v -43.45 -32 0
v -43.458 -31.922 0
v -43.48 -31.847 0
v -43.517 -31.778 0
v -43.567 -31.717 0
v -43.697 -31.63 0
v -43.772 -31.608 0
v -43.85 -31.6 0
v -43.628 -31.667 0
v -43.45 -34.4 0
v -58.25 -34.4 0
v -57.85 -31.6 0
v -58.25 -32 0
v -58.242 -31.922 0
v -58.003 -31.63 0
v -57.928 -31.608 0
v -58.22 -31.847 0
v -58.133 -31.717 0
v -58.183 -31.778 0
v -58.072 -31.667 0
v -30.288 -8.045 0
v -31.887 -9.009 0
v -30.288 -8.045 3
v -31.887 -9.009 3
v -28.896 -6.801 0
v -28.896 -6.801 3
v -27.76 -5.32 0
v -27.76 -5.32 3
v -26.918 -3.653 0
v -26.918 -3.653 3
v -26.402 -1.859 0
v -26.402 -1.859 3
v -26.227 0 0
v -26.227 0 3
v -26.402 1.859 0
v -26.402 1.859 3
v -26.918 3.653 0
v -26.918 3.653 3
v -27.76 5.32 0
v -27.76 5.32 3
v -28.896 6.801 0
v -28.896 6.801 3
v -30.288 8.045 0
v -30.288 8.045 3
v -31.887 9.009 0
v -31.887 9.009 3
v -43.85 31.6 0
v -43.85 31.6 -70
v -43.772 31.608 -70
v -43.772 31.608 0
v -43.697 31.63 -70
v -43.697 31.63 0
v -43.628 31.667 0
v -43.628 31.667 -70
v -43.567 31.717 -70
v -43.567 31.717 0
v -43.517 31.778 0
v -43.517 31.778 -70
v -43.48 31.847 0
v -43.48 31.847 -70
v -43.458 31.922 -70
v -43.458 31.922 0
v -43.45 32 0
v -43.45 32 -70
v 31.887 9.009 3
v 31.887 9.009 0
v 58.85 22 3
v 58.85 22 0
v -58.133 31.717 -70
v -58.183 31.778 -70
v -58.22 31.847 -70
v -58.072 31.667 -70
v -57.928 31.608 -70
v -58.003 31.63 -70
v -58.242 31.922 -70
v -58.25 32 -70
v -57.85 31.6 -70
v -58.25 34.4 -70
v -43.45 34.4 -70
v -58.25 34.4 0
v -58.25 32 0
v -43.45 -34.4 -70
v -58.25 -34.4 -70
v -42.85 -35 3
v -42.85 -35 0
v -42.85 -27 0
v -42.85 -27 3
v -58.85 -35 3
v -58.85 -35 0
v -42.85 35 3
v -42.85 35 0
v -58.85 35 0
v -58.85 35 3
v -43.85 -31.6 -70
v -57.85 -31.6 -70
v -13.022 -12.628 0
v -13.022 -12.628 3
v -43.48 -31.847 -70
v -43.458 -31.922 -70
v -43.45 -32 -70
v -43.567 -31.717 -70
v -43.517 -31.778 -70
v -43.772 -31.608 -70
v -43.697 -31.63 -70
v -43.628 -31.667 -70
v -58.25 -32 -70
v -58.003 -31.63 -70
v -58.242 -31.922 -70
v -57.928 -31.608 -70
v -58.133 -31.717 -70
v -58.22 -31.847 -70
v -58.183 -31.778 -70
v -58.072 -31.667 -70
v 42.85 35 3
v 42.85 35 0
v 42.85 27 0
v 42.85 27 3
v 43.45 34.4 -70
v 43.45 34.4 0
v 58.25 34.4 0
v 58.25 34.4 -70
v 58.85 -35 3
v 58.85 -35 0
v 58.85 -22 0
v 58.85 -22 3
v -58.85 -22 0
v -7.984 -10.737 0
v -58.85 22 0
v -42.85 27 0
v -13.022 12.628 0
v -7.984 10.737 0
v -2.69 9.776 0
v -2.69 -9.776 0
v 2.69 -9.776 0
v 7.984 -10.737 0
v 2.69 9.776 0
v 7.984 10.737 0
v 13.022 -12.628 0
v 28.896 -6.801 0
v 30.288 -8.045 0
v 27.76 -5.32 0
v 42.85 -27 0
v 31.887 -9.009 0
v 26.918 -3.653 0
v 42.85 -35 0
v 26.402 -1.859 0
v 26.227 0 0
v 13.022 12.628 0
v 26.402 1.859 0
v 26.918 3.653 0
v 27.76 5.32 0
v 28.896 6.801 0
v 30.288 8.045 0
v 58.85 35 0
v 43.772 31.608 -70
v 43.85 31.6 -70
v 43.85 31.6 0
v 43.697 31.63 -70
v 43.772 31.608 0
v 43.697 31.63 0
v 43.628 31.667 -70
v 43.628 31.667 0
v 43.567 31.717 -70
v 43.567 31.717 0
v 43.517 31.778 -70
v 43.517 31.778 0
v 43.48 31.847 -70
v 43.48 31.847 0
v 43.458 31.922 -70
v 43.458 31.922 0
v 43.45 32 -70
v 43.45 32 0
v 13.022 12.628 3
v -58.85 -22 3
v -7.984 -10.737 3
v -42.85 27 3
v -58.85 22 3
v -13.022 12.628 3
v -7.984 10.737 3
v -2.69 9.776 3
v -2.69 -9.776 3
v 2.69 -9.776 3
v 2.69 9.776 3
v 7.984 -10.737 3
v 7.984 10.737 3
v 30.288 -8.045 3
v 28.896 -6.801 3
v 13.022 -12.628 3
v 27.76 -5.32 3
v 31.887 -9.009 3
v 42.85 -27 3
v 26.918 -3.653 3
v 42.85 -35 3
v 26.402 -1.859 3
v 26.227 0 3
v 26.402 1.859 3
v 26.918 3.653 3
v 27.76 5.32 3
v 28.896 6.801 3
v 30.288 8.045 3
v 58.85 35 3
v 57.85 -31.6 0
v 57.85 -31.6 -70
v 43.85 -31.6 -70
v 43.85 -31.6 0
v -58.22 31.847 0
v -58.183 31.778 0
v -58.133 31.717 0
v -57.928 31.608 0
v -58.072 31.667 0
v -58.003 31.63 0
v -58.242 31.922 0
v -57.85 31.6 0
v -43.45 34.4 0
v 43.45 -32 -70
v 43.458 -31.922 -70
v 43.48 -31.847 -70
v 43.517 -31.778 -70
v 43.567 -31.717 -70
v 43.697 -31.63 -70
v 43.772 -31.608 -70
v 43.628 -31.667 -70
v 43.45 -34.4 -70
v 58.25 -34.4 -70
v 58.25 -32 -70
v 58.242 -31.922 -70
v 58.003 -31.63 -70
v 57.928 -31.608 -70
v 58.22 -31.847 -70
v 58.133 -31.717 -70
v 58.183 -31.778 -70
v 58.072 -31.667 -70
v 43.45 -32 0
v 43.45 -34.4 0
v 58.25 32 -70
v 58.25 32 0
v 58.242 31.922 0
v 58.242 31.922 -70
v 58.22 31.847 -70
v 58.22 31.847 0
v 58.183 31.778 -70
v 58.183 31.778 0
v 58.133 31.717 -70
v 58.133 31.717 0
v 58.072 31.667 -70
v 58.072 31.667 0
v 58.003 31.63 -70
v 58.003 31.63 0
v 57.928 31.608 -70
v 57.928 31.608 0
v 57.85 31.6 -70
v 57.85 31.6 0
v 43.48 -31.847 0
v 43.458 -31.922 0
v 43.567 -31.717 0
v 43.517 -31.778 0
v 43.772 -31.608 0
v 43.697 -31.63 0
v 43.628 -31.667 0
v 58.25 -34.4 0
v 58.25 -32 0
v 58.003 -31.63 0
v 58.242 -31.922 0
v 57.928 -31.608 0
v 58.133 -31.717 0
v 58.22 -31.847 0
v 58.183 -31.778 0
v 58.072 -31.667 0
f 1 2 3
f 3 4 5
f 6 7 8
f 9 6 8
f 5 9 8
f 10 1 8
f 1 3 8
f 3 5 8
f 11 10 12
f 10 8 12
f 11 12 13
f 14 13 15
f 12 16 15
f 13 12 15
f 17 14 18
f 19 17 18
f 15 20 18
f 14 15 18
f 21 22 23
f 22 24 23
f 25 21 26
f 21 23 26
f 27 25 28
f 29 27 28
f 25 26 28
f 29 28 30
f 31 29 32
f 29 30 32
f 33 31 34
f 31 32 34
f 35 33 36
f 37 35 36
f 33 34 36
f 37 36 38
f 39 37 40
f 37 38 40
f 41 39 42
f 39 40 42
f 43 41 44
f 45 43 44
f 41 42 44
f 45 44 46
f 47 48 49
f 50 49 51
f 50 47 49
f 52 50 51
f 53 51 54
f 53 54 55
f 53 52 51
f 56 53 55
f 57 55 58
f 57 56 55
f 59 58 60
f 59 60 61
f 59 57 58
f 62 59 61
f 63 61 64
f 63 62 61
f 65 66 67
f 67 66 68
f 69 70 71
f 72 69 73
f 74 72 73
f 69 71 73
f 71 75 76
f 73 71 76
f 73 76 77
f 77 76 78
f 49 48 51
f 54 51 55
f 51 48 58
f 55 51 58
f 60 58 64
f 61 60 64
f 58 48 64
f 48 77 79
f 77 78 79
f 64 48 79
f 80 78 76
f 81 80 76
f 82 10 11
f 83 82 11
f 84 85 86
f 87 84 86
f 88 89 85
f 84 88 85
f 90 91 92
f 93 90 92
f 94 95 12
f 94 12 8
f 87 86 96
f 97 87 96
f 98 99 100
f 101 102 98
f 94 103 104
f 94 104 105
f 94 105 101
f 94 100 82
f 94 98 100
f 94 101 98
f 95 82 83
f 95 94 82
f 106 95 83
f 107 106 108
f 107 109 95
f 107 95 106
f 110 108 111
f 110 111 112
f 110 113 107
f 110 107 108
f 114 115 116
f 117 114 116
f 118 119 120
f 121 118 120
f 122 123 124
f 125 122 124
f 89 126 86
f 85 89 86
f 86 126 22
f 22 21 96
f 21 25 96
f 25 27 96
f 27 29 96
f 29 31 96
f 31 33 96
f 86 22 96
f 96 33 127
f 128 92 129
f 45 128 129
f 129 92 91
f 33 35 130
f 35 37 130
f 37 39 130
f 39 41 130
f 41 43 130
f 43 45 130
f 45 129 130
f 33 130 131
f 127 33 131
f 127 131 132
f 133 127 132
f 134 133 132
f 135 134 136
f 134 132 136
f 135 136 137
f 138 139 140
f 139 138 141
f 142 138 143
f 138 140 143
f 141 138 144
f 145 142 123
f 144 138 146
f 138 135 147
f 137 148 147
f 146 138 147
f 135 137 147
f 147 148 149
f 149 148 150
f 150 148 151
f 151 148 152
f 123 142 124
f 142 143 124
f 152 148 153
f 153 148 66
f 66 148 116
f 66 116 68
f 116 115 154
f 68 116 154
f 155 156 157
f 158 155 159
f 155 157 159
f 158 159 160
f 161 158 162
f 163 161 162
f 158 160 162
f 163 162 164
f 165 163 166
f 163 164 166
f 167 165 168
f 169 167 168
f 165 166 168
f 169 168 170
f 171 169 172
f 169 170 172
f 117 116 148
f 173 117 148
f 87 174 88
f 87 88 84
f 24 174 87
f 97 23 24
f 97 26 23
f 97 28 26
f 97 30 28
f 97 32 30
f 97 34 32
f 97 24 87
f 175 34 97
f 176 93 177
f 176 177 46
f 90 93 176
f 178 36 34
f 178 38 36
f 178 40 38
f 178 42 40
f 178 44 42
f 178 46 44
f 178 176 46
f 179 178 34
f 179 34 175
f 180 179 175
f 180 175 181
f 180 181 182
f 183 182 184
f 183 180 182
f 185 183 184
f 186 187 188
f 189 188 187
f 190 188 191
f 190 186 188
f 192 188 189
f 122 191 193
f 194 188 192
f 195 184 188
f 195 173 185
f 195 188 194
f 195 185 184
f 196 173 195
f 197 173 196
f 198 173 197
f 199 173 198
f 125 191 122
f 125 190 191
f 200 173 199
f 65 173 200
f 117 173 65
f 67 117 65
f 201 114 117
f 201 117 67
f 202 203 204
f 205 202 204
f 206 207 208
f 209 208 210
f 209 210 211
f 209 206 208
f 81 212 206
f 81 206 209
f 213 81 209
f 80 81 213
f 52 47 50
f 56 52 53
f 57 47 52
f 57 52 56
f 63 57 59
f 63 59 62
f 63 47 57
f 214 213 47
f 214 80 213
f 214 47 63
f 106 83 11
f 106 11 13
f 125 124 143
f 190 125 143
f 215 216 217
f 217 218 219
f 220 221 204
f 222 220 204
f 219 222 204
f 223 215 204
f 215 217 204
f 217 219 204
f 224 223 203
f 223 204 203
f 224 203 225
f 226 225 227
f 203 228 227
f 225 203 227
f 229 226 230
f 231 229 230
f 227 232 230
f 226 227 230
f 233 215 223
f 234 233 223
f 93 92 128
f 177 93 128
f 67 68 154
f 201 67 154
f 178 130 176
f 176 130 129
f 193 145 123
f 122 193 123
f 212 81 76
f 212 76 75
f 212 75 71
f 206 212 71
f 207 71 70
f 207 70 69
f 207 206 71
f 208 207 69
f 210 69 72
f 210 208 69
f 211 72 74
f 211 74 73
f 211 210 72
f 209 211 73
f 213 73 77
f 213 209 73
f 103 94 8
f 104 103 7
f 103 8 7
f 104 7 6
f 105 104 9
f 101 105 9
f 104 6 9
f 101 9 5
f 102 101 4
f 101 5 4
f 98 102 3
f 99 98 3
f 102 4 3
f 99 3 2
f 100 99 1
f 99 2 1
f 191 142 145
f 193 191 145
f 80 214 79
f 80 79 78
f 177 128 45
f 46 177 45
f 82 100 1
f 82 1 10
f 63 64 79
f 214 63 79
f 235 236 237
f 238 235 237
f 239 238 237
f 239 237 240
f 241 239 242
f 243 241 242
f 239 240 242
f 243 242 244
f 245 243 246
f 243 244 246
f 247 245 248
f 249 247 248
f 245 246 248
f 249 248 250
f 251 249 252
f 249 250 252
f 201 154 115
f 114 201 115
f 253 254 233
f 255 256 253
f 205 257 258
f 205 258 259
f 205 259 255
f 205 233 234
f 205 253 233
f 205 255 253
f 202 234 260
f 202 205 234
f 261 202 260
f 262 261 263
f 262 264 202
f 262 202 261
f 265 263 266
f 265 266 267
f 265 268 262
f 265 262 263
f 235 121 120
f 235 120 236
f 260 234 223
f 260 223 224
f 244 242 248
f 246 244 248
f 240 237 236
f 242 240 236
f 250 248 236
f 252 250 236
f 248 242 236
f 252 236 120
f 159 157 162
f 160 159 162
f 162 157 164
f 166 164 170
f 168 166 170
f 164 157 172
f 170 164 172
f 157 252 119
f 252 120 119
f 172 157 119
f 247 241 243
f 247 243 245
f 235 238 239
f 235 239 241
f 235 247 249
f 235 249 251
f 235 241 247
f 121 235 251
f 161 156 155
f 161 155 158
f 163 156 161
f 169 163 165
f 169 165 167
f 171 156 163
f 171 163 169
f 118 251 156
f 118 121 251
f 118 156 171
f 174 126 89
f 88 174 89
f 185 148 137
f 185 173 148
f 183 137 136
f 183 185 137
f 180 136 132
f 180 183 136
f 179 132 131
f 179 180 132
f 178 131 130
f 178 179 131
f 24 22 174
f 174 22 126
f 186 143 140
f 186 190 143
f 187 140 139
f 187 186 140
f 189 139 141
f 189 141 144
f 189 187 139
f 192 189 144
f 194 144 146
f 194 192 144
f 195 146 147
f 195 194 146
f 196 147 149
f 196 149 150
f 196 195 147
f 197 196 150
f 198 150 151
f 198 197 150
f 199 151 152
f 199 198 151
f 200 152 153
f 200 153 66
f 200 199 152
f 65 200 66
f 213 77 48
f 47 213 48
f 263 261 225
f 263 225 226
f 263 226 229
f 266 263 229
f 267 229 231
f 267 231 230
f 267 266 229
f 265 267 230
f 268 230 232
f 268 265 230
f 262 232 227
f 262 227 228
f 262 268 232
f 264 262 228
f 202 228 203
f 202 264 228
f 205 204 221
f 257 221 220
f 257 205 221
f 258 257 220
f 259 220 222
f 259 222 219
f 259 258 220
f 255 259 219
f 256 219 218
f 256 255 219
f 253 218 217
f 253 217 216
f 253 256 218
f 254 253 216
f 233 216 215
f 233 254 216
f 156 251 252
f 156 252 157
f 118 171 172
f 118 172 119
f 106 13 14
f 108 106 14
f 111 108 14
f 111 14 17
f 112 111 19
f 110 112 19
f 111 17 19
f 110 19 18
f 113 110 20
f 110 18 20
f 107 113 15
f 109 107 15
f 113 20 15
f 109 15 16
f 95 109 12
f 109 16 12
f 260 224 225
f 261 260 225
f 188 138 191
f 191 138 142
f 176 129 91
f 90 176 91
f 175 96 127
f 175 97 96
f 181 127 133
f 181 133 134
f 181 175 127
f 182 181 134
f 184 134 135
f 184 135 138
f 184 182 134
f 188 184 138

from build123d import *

# Parameters (mm, degrees)
EXTRUDE_1_DEPTH = 3
FILLET_1_R      = 30
FILLET_2_R      = 10
EXTRUDE_2_DEPTH = 70


with BuildPart() as part:
    # Эскиз1 → Бобышка-Вытянуть1 (new body)
    with BuildSketch(Plane.XY):
        with BuildLine():
            ThreePointArc((-57.85, 31), (-58.557106781, 31.292893219), (-58.85, 32))
            Line((-58.85, 32), (-58.85, 22))
            Line((-58.85, 22), (-13.18877551, 0))
            Line((-13.18877551, 0), (0, 6.354473943))
            Line((0, 6.354473943), (-42.85, 27))
            Line((-42.85, 27), (-42.85, 32))
            ThreePointArc((-42.85, 32), (-43.142893219, 31.292893219), (-43.85, 31))
            Line((-43.85, 31), (-57.85, 31))
        make_face()
        with BuildLine():
            Line((42.85, 27), (0, 6.354473943))
            Line((0, 6.354473943), (13.18877551, 0))
            Line((13.18877551, 0), (58.85, 22))
            Line((58.85, 22), (58.85, 32))
            ThreePointArc((58.85, 32), (58.557106781, 31.292893219), (57.85, 31))
            Line((57.85, 31), (43.85, 31))
            ThreePointArc((43.85, 31), (43.142893219, 31.292893219), (42.85, 32))
            Line((42.85, 32), (42.85, 27))
        make_face()
        with BuildLine():
            Line((-58.85, -22), (-58.85, -32))
            ThreePointArc((-58.85, -32), (-58.557106781, -31.292893219), (-57.85, -31))
            Line((-57.85, -31), (-43.85, -31))
            ThreePointArc((-43.85, -31), (-43.142893219, -31.292893219), (-42.85, -32))
            Line((-42.85, -32), (-42.85, -27))
            Line((-42.85, -27), (0, -6.354473943))
            Line((0, -6.354473943), (-13.18877551, 0))
            Line((-13.18877551, 0), (-58.85, -22))
        make_face()
        with BuildLine():
            Line((42.85, -27), (42.85, -32))
            ThreePointArc((42.85, -32), (43.142893219, -31.292893219), (43.85, -31))
            Line((43.85, -31), (57.85, -31))
            ThreePointArc((57.85, -31), (58.557106781, -31.292893219), (58.85, -32))
            Line((58.85, -32), (58.85, -22))
            Line((58.85, -22), (13.18877551, 0))
            Line((13.18877551, 0), (0, -6.354473943))
            Line((0, -6.354473943), (42.85, -27))
        make_face()
        Polygon((0, 6.354473943), (-13.18877551, 0), (0, -6.354473943), (13.18877551, 0), align=None)
        with BuildLine():
            Line((-42.85, 35), (-58.85, 35))
            Line((-58.85, 35), (-58.85, 32))
            ThreePointArc((-58.85, 32), (-58.557106781, 31.292893219), (-57.85, 31))
            Line((-57.85, 31), (-43.85, 31))
            ThreePointArc((-43.85, 31), (-43.142893219, 31.292893219), (-42.85, 32))
            Line((-42.85, 32), (-42.85, 35))
        make_face()
        with BuildLine():
            Line((-58.85, -32), (-58.85, -35))
            Line((-58.85, -35), (-42.85, -35))
            Line((-42.85, -35), (-42.85, -32))
            ThreePointArc((-42.85, -32), (-43.142893219, -31.292893219), (-43.85, -31))
            Line((-43.85, -31), (-57.85, -31))
            ThreePointArc((-57.85, -31), (-58.557106781, -31.292893219), (-58.85, -32))
        make_face()
        with BuildLine():
            Line((42.85, -32), (42.85, -35))
            Line((42.85, -35), (58.85, -35))
            Line((58.85, -35), (58.85, -32))
            ThreePointArc((58.85, -32), (58.557106781, -31.292893219), (57.85, -31))
            Line((57.85, -31), (43.85, -31))
            ThreePointArc((43.85, -31), (43.142893219, -31.292893219), (42.85, -32))
        make_face()
        with BuildLine():
            Line((58.85, 35), (42.85, 35))
            Line((42.85, 35), (42.85, 32))
            ThreePointArc((42.85, 32), (43.142893219, 31.292893219), (43.85, 31))
            Line((43.85, 31), (57.85, 31))
            ThreePointArc((57.85, 31), (58.557106781, 31.292893219), (58.85, 32))
            Line((58.85, 32), (58.85, 35))
        make_face()
    extrude(amount=EXTRUDE_1_DEPTH)

    # Скругление1
    fillet_1_edges = [part.edges().sort_by_distance(p)[0] for p in [
        (0, -6.354473943, 1.5),
        (0, 6.354473943, 1.5),
    ]]
    fillet(fillet_1_edges, radius=FILLET_1_R)

    # Скругление2
    fillet_2_edges = [part.edges().sort_by_distance(p)[0] for p in [
        (-13.18877551, 0, 1.5),
        (13.18877551, 0, 1.5),
    ]]
    fillet(fillet_2_edges, radius=FILLET_2_R)


with BuildPart() as body_2:
    # Эскиз2 → Бобышка-Вытянуть2 (new body)
    with BuildSketch(Plane(origin=(0, 0, 0), x_dir=(-1, 0, 0), z_dir=(0, 0, -1))):
        with BuildLine():
            Line((-50.85, 34.4), (-58.25, 34.4))
            Line((-58.25, 34.4), (-58.25, 32))
            ThreePointArc((-58.25, 32), (-58.132842712, 31.717157288), (-57.85, 31.6))
            Line((-57.85, 31.6), (-50.85, 31.6))
            Line((-50.85, 31.6), (-50.85, 34.4))
        make_face()
        with BuildLine():
            Line((-43.45, 34.4), (-50.85, 34.4))
            Line((-50.85, 34.4), (-50.85, 31.6))
            Line((-50.85, 31.6), (-43.85, 31.6))
            ThreePointArc((-43.85, 31.6), (-43.567157288, 31.717157288), (-43.45, 32))
            Line((-43.45, 32), (-43.45, 34.4))
        make_face()
        with BuildLine():
            Line((-57.85, -31.6), (-43.85, -31.6))
            ThreePointArc((-43.85, -31.6), (-43.567157288, -31.717157288), (-43.45, -32))
            Line((-43.45, -32), (-43.45, -34.4))
            Line((-43.45, -34.4), (-58.25, -34.4))
            Line((-58.25, -34.4), (-58.25, -32))
            ThreePointArc((-58.25, -32), (-58.132842712, -31.717157288), (-57.85, -31.6))
        make_face()
        with BuildLine():
            Line((57.85, -31.6), (43.85, -31.6))
            ThreePointArc((43.85, -31.6), (43.567157288, -31.717157288), (43.45, -32))
            Line((43.45, -32), (43.45, -34.4))
            Line((43.45, -34.4), (58.25, -34.4))
            Line((58.25, -34.4), (58.25, -32))
            ThreePointArc((58.25, -32), (58.132842712, -31.717157288), (57.85, -31.6))
        make_face()
        with BuildLine():
            Line((43.45, 32), (43.45, 34.4))
            Line((43.45, 34.4), (58.25, 34.4))
            Line((58.25, 34.4), (58.25, 32))
            ThreePointArc((58.25, 32), (58.132842712, 31.717157288), (57.85, 31.6))
            Line((57.85, 31.6), (43.85, 31.6))
            ThreePointArc((43.85, 31.6), (43.567157288, 31.717157288), (43.45, 32))
        make_face()
    extrude(amount=EXTRUDE_2_DEPTH)


solid = Compound([part.part, body_2.part])
